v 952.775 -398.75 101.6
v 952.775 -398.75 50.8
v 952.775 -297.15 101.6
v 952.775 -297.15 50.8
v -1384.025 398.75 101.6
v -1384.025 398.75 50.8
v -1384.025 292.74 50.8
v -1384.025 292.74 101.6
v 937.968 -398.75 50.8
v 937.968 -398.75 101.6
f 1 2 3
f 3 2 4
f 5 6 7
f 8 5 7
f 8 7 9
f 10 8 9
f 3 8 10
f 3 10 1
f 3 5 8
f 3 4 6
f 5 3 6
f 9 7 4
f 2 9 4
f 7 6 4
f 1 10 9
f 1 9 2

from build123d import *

# Parameters (mm, degrees)
BOSS_EXTRUDE2_DEPTH = 50.8


with BuildPart() as part:
    # Sketch3 → Boss-Extrude2 (new body)
    with BuildSketch(Plane.XY.offset(50.8)):
        Polygon((-1384.025, 292.740485768), (937.968055241, -398.75), (952.775, -398.75), (952.775, -297.15), (-1384.025, 398.75), align=None)
    extrude(amount=BOSS_EXTRUDE2_DEPTH)


solid = part.part
